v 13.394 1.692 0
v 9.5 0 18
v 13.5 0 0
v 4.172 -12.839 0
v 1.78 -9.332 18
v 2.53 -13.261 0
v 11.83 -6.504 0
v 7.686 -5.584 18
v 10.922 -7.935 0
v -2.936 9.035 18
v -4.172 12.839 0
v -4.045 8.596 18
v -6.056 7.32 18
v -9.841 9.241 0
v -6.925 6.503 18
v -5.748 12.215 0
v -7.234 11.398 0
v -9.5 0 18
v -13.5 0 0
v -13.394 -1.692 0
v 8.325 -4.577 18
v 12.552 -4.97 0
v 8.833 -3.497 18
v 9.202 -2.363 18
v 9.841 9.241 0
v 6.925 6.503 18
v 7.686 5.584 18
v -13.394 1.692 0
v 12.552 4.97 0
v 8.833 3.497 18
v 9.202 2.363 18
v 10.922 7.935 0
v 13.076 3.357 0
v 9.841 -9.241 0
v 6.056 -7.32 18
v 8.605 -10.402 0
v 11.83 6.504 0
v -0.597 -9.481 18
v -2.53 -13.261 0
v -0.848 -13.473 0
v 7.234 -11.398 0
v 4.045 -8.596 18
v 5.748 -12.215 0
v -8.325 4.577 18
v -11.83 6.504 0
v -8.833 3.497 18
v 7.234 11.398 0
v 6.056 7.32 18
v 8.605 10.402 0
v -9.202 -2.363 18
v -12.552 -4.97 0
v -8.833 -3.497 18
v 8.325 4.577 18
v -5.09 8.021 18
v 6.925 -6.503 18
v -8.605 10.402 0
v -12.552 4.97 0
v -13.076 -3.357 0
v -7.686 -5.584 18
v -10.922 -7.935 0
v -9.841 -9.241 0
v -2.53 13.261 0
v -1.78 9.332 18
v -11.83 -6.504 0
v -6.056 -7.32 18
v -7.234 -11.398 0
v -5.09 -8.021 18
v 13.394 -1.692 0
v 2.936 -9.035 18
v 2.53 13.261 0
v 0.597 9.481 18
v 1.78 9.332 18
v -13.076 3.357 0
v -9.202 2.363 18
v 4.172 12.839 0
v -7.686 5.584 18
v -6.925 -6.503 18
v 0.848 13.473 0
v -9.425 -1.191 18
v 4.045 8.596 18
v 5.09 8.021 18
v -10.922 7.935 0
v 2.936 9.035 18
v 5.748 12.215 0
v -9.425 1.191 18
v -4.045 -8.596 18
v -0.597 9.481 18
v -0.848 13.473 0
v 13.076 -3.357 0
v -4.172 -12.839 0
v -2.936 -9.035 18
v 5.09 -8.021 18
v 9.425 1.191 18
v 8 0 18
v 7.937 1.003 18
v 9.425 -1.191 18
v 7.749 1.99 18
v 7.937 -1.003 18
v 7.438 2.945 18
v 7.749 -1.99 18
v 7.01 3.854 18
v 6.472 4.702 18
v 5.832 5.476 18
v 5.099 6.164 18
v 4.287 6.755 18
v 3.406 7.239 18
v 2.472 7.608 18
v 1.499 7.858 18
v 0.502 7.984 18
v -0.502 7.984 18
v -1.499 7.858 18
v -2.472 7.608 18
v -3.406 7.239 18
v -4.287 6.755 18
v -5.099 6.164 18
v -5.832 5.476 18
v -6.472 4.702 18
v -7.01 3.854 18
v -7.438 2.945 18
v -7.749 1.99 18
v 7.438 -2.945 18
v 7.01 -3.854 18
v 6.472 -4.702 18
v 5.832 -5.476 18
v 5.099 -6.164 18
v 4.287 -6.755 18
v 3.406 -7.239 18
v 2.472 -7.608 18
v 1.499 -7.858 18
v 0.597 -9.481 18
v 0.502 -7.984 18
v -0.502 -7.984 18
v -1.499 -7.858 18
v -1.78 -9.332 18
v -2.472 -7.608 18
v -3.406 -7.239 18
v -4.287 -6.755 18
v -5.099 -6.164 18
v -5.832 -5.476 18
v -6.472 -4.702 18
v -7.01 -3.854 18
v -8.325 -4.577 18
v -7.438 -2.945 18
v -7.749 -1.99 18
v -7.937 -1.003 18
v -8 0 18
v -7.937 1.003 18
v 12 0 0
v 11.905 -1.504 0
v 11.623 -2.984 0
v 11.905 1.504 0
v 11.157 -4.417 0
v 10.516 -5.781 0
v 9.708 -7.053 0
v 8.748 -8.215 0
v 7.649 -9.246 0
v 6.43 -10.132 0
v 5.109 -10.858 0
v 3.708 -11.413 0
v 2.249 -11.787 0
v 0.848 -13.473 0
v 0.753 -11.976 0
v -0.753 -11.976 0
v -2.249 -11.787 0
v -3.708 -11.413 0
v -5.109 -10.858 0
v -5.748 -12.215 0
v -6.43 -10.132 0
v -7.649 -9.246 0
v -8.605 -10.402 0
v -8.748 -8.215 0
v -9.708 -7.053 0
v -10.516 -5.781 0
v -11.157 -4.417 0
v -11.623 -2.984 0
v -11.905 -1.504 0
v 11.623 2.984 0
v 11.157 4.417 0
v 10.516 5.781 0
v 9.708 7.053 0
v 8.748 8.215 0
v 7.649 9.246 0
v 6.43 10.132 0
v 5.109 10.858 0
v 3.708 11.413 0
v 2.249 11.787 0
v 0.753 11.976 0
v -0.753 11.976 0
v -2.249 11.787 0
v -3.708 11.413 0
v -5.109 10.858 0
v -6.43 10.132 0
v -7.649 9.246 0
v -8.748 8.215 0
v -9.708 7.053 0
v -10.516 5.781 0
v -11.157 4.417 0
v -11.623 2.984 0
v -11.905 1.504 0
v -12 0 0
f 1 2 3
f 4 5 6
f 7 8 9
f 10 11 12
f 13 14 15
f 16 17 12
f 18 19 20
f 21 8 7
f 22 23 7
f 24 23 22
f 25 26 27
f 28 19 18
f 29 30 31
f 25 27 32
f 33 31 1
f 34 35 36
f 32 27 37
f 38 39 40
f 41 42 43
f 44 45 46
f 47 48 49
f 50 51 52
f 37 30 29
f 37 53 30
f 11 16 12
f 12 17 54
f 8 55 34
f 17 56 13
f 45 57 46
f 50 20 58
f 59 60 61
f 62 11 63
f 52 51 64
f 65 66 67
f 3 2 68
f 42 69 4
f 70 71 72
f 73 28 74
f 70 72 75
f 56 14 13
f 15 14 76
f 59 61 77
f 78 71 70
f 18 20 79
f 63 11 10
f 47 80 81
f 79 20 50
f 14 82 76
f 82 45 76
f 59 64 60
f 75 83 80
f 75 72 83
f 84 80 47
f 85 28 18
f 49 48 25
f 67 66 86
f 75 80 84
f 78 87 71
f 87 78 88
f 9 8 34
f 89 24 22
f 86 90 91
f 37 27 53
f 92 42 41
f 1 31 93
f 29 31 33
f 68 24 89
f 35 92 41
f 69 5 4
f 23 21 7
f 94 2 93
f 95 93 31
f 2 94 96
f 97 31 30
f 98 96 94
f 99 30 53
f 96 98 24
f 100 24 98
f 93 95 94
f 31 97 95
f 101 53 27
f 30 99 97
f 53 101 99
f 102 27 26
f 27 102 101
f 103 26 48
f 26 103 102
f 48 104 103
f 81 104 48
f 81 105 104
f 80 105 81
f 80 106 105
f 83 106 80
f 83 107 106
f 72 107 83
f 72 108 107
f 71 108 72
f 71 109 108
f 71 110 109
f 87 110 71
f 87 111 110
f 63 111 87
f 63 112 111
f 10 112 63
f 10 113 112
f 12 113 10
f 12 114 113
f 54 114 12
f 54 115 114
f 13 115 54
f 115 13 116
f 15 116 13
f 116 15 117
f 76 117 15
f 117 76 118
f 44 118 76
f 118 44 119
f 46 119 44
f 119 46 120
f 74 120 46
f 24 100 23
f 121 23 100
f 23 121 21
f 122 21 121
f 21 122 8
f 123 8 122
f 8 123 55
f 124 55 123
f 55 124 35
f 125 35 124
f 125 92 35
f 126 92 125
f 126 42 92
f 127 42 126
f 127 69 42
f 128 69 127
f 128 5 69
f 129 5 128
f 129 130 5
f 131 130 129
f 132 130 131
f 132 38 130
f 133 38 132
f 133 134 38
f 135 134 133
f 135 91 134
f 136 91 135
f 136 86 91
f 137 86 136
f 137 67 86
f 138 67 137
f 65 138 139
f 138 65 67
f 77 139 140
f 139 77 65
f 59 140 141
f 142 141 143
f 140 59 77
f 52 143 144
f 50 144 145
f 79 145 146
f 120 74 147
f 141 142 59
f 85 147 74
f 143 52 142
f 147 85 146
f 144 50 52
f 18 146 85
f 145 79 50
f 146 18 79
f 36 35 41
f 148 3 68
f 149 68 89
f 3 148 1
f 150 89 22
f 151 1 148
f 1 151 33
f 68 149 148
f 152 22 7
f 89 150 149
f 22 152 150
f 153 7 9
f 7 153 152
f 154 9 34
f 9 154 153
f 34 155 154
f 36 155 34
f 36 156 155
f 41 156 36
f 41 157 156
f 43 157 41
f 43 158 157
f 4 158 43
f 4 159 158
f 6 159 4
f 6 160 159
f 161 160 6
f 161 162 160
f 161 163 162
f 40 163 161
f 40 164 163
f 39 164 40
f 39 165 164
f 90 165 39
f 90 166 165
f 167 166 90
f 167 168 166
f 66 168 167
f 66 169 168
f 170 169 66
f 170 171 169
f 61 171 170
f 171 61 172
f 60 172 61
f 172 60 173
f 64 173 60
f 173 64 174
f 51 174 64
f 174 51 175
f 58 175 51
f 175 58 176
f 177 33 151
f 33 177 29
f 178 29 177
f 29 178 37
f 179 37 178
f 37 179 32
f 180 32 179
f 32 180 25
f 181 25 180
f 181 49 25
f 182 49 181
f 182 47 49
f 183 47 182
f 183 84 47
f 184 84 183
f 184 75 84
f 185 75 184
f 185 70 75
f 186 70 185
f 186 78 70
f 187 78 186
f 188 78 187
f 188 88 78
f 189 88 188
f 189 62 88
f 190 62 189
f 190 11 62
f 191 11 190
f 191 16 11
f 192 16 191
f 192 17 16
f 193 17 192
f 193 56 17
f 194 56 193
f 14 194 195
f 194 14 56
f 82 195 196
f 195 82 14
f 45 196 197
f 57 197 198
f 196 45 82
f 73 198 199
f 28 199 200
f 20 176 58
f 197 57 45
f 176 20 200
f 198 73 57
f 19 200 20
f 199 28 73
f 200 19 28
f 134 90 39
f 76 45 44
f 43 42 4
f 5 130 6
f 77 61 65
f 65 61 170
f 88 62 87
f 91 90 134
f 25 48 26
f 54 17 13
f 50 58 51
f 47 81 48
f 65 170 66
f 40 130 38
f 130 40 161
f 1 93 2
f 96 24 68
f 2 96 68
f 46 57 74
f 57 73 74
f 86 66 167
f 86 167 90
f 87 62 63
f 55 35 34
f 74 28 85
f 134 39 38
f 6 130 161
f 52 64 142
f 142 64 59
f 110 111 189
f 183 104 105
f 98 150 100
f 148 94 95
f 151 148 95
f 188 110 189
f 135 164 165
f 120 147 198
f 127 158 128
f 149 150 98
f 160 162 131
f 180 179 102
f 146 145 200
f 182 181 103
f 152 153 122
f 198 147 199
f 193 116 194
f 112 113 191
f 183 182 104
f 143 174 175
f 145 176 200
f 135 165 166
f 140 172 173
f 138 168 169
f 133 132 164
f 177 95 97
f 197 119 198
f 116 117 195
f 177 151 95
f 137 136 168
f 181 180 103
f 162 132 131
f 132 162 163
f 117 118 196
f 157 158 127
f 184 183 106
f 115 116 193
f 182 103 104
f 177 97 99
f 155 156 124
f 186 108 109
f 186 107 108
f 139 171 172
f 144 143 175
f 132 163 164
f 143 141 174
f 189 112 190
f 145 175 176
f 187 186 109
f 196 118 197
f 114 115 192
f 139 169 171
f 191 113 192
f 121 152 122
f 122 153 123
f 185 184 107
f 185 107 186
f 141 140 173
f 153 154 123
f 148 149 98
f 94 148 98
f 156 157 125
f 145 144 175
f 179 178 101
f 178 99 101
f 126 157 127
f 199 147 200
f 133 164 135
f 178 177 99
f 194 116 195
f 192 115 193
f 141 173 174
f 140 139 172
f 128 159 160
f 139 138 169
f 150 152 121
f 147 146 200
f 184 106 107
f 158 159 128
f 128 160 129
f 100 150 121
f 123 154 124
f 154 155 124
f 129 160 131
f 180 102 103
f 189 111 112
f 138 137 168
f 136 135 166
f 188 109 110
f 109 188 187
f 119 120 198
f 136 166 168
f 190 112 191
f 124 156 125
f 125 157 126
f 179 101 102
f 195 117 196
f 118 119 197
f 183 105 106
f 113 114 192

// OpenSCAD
$fn = 50;

difference() {
	union() {
		difference() {
			cylinder(h = 18, r1 = 13.5, r2 = 9.5);
			cylinder(h = 18, r1 = 12, r2 = 8);
		}
	}
	union();
}
